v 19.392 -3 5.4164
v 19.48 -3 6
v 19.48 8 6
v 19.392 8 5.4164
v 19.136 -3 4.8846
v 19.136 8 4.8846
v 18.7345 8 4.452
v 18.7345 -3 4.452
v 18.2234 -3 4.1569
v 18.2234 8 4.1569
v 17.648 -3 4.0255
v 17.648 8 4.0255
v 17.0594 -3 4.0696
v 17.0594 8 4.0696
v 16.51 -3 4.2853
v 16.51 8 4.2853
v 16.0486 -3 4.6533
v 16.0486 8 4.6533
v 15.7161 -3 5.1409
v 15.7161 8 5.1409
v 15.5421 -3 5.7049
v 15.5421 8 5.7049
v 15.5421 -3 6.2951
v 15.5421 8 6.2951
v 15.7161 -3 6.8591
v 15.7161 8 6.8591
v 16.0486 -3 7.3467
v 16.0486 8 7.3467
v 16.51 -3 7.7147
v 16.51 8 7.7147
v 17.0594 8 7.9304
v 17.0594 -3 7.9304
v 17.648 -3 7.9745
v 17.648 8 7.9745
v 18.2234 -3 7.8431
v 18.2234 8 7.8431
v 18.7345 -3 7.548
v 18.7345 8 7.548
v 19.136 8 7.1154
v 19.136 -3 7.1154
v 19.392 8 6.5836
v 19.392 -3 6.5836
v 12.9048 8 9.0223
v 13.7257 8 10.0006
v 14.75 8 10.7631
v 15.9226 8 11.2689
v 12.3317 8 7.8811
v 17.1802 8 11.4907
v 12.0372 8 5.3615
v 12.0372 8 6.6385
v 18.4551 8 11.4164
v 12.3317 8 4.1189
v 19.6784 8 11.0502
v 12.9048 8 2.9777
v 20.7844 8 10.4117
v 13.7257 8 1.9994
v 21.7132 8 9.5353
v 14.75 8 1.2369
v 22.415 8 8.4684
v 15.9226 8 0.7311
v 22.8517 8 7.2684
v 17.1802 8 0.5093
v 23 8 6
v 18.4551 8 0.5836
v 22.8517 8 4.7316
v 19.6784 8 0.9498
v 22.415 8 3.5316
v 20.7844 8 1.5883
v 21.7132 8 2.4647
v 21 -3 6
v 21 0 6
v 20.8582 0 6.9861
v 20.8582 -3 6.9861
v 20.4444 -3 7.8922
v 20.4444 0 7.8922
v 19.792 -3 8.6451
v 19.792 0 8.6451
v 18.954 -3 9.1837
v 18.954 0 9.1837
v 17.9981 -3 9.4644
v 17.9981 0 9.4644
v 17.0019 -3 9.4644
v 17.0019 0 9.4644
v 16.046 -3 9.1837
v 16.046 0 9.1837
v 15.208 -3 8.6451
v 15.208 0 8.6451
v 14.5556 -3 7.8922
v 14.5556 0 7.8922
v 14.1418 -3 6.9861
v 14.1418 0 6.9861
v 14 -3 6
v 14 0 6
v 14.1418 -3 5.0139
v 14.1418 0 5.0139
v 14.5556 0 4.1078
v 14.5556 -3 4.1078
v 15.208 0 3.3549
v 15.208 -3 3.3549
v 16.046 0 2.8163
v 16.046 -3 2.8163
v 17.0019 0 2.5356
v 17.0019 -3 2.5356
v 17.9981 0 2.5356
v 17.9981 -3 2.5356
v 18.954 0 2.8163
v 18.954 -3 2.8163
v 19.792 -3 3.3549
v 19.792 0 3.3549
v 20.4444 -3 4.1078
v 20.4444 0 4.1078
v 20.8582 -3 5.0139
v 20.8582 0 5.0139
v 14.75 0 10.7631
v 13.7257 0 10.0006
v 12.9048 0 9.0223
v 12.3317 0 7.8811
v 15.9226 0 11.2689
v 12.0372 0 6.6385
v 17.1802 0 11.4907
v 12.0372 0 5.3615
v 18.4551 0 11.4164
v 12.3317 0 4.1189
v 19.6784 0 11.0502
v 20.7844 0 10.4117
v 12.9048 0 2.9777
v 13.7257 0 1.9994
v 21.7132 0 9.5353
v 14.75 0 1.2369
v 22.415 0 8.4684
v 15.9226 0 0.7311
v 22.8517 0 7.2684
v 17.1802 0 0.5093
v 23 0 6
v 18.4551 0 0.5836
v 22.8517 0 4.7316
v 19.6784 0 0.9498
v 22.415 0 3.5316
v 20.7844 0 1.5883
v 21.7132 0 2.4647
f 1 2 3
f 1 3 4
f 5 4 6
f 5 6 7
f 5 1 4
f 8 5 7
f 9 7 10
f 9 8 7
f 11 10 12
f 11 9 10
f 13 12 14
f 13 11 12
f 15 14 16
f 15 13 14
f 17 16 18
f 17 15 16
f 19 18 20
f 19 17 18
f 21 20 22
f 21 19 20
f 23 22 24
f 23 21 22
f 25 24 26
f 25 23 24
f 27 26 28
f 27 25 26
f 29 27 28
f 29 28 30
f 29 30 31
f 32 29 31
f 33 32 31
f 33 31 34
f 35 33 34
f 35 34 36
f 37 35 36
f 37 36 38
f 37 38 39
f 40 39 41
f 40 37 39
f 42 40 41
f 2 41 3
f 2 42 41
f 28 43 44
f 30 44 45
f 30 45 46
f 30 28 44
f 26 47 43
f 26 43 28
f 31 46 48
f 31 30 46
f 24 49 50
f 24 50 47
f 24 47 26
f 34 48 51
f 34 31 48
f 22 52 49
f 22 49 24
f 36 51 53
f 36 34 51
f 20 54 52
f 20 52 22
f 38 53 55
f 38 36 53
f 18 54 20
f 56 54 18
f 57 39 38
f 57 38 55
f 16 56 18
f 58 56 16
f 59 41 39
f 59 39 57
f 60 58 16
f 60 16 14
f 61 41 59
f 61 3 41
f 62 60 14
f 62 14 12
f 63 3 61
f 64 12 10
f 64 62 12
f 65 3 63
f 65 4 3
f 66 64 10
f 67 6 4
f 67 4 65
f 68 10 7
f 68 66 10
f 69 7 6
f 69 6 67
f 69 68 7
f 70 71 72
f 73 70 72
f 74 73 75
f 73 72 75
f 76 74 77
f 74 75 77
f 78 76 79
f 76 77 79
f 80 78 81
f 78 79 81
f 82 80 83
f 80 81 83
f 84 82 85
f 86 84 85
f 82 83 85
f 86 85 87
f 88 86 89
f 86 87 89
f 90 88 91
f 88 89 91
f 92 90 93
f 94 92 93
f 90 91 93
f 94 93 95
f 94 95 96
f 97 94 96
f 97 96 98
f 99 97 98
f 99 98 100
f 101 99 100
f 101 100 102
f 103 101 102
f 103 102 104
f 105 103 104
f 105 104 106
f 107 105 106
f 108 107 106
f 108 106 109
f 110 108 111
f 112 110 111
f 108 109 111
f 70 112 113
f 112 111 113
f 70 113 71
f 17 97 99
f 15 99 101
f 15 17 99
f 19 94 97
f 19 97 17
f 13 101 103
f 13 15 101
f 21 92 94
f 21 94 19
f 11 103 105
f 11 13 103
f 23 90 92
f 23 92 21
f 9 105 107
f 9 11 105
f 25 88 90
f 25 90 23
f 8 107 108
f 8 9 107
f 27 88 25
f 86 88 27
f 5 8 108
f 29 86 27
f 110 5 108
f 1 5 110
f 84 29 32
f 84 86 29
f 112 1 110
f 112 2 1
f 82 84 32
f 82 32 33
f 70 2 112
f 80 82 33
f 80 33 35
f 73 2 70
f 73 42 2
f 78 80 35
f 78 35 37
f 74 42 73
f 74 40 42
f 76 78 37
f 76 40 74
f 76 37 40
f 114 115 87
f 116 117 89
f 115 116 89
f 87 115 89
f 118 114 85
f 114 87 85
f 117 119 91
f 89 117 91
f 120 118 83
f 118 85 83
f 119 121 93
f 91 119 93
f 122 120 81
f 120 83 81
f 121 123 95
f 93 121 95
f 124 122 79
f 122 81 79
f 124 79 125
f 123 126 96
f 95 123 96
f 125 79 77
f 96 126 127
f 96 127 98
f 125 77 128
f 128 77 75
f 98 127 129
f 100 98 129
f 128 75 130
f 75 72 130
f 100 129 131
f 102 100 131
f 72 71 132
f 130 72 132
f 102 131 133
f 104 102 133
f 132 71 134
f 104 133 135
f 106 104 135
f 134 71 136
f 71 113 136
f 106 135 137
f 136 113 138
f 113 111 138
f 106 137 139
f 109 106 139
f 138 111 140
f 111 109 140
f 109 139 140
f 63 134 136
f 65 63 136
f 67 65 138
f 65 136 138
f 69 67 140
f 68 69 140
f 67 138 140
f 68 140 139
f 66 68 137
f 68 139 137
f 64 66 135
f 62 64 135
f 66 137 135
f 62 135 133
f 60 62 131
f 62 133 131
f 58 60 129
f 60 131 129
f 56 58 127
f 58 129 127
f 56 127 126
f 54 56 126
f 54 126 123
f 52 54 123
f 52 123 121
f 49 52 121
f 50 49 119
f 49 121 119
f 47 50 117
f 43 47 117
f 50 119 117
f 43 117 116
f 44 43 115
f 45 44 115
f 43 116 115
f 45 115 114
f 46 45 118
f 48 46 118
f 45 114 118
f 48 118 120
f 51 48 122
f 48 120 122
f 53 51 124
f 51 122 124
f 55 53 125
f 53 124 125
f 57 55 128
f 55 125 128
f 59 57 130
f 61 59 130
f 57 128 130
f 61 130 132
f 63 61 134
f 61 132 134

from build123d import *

# Parameters (mm, degrees)
CYLINDER001_R          = 1.98
CYLINDER001_DEPTH      = 11
CYLINDER001_ROLL_ANGLE = -90
CYLINDER004_R          = 3.5
CYLINDER004_DEPTH      = 3
CYLINDER004_ROLL_ANGLE = 90
CYLINDER_R             = 5.5
CYLINDER_DEPTH         = 8
CYLINDER_ROLL_ANGLE    = -90


with BuildPart() as f_10_32_tap_hole:
    # Cylinder001 → Cylinder001 (new body)
    with BuildSketch(Plane.XY):
        Circle(CYLINDER001_R)
    extrude(amount=CYLINDER001_DEPTH)


with BuildPart() as f_10_32_tap_hole_1:
    # Cylinder001 roll: moved
    add(f_10_32_tap_hole.part.rotate(Axis((0, 0, 0), (1, 0, 0)), CYLINDER001_ROLL_ANGLE))


with BuildPart() as f_10_32_tap_hole_2:
    # Cylinder001 placement: moved
    add(f_10_32_tap_hole_1.part.moved(Location((17.5, -3, 6))))


with BuildPart() as thin_neck:
    # Cylinder004 → Cylinder004 (new body)
    with BuildSketch(Plane.XY):
        Circle(CYLINDER004_R)
    extrude(amount=CYLINDER004_DEPTH)


with BuildPart() as thin_neck_1:
    # Cylinder004 roll: moved
    add(thin_neck.part.rotate(Axis((0, 0, 0), (1, 0, 0)), CYLINDER004_ROLL_ANGLE))


with BuildPart() as thin_neck_2:
    # Cylinder004 placement: moved
    add(thin_neck_1.part.moved(Location((17.5, 0, 6))))


with BuildPart() as f_10_32_support_neck_and_taphole:
    # Cylinder → Cylinder (new body)
    with BuildSketch(Plane.XY):
        Circle(CYLINDER_R)
    extrude(amount=CYLINDER_DEPTH)


with BuildPart() as f_10_32_support_neck_and_taphole_1:
    # Cylinder roll: moved
    add(f_10_32_support_neck_and_taphole.part.rotate(Axis((0, 0, 0), (1, 0, 0)), CYLINDER_ROLL_ANGLE))


with BuildPart() as f_10_32_support_neck_and_taphole_2:
    # Cylinder placement: moved
    add(f_10_32_support_neck_and_taphole_1.part.moved(Location((17.5, 0, 6))))

    # Fusion002: union thin_neck
    add(thin_neck_2.part)

    # Cut: cut 10-32_tap_hole
    add(f_10_32_tap_hole_2.part, mode=Mode.SUBTRACT)


solid = f_10_32_support_neck_and_taphole_2.part
